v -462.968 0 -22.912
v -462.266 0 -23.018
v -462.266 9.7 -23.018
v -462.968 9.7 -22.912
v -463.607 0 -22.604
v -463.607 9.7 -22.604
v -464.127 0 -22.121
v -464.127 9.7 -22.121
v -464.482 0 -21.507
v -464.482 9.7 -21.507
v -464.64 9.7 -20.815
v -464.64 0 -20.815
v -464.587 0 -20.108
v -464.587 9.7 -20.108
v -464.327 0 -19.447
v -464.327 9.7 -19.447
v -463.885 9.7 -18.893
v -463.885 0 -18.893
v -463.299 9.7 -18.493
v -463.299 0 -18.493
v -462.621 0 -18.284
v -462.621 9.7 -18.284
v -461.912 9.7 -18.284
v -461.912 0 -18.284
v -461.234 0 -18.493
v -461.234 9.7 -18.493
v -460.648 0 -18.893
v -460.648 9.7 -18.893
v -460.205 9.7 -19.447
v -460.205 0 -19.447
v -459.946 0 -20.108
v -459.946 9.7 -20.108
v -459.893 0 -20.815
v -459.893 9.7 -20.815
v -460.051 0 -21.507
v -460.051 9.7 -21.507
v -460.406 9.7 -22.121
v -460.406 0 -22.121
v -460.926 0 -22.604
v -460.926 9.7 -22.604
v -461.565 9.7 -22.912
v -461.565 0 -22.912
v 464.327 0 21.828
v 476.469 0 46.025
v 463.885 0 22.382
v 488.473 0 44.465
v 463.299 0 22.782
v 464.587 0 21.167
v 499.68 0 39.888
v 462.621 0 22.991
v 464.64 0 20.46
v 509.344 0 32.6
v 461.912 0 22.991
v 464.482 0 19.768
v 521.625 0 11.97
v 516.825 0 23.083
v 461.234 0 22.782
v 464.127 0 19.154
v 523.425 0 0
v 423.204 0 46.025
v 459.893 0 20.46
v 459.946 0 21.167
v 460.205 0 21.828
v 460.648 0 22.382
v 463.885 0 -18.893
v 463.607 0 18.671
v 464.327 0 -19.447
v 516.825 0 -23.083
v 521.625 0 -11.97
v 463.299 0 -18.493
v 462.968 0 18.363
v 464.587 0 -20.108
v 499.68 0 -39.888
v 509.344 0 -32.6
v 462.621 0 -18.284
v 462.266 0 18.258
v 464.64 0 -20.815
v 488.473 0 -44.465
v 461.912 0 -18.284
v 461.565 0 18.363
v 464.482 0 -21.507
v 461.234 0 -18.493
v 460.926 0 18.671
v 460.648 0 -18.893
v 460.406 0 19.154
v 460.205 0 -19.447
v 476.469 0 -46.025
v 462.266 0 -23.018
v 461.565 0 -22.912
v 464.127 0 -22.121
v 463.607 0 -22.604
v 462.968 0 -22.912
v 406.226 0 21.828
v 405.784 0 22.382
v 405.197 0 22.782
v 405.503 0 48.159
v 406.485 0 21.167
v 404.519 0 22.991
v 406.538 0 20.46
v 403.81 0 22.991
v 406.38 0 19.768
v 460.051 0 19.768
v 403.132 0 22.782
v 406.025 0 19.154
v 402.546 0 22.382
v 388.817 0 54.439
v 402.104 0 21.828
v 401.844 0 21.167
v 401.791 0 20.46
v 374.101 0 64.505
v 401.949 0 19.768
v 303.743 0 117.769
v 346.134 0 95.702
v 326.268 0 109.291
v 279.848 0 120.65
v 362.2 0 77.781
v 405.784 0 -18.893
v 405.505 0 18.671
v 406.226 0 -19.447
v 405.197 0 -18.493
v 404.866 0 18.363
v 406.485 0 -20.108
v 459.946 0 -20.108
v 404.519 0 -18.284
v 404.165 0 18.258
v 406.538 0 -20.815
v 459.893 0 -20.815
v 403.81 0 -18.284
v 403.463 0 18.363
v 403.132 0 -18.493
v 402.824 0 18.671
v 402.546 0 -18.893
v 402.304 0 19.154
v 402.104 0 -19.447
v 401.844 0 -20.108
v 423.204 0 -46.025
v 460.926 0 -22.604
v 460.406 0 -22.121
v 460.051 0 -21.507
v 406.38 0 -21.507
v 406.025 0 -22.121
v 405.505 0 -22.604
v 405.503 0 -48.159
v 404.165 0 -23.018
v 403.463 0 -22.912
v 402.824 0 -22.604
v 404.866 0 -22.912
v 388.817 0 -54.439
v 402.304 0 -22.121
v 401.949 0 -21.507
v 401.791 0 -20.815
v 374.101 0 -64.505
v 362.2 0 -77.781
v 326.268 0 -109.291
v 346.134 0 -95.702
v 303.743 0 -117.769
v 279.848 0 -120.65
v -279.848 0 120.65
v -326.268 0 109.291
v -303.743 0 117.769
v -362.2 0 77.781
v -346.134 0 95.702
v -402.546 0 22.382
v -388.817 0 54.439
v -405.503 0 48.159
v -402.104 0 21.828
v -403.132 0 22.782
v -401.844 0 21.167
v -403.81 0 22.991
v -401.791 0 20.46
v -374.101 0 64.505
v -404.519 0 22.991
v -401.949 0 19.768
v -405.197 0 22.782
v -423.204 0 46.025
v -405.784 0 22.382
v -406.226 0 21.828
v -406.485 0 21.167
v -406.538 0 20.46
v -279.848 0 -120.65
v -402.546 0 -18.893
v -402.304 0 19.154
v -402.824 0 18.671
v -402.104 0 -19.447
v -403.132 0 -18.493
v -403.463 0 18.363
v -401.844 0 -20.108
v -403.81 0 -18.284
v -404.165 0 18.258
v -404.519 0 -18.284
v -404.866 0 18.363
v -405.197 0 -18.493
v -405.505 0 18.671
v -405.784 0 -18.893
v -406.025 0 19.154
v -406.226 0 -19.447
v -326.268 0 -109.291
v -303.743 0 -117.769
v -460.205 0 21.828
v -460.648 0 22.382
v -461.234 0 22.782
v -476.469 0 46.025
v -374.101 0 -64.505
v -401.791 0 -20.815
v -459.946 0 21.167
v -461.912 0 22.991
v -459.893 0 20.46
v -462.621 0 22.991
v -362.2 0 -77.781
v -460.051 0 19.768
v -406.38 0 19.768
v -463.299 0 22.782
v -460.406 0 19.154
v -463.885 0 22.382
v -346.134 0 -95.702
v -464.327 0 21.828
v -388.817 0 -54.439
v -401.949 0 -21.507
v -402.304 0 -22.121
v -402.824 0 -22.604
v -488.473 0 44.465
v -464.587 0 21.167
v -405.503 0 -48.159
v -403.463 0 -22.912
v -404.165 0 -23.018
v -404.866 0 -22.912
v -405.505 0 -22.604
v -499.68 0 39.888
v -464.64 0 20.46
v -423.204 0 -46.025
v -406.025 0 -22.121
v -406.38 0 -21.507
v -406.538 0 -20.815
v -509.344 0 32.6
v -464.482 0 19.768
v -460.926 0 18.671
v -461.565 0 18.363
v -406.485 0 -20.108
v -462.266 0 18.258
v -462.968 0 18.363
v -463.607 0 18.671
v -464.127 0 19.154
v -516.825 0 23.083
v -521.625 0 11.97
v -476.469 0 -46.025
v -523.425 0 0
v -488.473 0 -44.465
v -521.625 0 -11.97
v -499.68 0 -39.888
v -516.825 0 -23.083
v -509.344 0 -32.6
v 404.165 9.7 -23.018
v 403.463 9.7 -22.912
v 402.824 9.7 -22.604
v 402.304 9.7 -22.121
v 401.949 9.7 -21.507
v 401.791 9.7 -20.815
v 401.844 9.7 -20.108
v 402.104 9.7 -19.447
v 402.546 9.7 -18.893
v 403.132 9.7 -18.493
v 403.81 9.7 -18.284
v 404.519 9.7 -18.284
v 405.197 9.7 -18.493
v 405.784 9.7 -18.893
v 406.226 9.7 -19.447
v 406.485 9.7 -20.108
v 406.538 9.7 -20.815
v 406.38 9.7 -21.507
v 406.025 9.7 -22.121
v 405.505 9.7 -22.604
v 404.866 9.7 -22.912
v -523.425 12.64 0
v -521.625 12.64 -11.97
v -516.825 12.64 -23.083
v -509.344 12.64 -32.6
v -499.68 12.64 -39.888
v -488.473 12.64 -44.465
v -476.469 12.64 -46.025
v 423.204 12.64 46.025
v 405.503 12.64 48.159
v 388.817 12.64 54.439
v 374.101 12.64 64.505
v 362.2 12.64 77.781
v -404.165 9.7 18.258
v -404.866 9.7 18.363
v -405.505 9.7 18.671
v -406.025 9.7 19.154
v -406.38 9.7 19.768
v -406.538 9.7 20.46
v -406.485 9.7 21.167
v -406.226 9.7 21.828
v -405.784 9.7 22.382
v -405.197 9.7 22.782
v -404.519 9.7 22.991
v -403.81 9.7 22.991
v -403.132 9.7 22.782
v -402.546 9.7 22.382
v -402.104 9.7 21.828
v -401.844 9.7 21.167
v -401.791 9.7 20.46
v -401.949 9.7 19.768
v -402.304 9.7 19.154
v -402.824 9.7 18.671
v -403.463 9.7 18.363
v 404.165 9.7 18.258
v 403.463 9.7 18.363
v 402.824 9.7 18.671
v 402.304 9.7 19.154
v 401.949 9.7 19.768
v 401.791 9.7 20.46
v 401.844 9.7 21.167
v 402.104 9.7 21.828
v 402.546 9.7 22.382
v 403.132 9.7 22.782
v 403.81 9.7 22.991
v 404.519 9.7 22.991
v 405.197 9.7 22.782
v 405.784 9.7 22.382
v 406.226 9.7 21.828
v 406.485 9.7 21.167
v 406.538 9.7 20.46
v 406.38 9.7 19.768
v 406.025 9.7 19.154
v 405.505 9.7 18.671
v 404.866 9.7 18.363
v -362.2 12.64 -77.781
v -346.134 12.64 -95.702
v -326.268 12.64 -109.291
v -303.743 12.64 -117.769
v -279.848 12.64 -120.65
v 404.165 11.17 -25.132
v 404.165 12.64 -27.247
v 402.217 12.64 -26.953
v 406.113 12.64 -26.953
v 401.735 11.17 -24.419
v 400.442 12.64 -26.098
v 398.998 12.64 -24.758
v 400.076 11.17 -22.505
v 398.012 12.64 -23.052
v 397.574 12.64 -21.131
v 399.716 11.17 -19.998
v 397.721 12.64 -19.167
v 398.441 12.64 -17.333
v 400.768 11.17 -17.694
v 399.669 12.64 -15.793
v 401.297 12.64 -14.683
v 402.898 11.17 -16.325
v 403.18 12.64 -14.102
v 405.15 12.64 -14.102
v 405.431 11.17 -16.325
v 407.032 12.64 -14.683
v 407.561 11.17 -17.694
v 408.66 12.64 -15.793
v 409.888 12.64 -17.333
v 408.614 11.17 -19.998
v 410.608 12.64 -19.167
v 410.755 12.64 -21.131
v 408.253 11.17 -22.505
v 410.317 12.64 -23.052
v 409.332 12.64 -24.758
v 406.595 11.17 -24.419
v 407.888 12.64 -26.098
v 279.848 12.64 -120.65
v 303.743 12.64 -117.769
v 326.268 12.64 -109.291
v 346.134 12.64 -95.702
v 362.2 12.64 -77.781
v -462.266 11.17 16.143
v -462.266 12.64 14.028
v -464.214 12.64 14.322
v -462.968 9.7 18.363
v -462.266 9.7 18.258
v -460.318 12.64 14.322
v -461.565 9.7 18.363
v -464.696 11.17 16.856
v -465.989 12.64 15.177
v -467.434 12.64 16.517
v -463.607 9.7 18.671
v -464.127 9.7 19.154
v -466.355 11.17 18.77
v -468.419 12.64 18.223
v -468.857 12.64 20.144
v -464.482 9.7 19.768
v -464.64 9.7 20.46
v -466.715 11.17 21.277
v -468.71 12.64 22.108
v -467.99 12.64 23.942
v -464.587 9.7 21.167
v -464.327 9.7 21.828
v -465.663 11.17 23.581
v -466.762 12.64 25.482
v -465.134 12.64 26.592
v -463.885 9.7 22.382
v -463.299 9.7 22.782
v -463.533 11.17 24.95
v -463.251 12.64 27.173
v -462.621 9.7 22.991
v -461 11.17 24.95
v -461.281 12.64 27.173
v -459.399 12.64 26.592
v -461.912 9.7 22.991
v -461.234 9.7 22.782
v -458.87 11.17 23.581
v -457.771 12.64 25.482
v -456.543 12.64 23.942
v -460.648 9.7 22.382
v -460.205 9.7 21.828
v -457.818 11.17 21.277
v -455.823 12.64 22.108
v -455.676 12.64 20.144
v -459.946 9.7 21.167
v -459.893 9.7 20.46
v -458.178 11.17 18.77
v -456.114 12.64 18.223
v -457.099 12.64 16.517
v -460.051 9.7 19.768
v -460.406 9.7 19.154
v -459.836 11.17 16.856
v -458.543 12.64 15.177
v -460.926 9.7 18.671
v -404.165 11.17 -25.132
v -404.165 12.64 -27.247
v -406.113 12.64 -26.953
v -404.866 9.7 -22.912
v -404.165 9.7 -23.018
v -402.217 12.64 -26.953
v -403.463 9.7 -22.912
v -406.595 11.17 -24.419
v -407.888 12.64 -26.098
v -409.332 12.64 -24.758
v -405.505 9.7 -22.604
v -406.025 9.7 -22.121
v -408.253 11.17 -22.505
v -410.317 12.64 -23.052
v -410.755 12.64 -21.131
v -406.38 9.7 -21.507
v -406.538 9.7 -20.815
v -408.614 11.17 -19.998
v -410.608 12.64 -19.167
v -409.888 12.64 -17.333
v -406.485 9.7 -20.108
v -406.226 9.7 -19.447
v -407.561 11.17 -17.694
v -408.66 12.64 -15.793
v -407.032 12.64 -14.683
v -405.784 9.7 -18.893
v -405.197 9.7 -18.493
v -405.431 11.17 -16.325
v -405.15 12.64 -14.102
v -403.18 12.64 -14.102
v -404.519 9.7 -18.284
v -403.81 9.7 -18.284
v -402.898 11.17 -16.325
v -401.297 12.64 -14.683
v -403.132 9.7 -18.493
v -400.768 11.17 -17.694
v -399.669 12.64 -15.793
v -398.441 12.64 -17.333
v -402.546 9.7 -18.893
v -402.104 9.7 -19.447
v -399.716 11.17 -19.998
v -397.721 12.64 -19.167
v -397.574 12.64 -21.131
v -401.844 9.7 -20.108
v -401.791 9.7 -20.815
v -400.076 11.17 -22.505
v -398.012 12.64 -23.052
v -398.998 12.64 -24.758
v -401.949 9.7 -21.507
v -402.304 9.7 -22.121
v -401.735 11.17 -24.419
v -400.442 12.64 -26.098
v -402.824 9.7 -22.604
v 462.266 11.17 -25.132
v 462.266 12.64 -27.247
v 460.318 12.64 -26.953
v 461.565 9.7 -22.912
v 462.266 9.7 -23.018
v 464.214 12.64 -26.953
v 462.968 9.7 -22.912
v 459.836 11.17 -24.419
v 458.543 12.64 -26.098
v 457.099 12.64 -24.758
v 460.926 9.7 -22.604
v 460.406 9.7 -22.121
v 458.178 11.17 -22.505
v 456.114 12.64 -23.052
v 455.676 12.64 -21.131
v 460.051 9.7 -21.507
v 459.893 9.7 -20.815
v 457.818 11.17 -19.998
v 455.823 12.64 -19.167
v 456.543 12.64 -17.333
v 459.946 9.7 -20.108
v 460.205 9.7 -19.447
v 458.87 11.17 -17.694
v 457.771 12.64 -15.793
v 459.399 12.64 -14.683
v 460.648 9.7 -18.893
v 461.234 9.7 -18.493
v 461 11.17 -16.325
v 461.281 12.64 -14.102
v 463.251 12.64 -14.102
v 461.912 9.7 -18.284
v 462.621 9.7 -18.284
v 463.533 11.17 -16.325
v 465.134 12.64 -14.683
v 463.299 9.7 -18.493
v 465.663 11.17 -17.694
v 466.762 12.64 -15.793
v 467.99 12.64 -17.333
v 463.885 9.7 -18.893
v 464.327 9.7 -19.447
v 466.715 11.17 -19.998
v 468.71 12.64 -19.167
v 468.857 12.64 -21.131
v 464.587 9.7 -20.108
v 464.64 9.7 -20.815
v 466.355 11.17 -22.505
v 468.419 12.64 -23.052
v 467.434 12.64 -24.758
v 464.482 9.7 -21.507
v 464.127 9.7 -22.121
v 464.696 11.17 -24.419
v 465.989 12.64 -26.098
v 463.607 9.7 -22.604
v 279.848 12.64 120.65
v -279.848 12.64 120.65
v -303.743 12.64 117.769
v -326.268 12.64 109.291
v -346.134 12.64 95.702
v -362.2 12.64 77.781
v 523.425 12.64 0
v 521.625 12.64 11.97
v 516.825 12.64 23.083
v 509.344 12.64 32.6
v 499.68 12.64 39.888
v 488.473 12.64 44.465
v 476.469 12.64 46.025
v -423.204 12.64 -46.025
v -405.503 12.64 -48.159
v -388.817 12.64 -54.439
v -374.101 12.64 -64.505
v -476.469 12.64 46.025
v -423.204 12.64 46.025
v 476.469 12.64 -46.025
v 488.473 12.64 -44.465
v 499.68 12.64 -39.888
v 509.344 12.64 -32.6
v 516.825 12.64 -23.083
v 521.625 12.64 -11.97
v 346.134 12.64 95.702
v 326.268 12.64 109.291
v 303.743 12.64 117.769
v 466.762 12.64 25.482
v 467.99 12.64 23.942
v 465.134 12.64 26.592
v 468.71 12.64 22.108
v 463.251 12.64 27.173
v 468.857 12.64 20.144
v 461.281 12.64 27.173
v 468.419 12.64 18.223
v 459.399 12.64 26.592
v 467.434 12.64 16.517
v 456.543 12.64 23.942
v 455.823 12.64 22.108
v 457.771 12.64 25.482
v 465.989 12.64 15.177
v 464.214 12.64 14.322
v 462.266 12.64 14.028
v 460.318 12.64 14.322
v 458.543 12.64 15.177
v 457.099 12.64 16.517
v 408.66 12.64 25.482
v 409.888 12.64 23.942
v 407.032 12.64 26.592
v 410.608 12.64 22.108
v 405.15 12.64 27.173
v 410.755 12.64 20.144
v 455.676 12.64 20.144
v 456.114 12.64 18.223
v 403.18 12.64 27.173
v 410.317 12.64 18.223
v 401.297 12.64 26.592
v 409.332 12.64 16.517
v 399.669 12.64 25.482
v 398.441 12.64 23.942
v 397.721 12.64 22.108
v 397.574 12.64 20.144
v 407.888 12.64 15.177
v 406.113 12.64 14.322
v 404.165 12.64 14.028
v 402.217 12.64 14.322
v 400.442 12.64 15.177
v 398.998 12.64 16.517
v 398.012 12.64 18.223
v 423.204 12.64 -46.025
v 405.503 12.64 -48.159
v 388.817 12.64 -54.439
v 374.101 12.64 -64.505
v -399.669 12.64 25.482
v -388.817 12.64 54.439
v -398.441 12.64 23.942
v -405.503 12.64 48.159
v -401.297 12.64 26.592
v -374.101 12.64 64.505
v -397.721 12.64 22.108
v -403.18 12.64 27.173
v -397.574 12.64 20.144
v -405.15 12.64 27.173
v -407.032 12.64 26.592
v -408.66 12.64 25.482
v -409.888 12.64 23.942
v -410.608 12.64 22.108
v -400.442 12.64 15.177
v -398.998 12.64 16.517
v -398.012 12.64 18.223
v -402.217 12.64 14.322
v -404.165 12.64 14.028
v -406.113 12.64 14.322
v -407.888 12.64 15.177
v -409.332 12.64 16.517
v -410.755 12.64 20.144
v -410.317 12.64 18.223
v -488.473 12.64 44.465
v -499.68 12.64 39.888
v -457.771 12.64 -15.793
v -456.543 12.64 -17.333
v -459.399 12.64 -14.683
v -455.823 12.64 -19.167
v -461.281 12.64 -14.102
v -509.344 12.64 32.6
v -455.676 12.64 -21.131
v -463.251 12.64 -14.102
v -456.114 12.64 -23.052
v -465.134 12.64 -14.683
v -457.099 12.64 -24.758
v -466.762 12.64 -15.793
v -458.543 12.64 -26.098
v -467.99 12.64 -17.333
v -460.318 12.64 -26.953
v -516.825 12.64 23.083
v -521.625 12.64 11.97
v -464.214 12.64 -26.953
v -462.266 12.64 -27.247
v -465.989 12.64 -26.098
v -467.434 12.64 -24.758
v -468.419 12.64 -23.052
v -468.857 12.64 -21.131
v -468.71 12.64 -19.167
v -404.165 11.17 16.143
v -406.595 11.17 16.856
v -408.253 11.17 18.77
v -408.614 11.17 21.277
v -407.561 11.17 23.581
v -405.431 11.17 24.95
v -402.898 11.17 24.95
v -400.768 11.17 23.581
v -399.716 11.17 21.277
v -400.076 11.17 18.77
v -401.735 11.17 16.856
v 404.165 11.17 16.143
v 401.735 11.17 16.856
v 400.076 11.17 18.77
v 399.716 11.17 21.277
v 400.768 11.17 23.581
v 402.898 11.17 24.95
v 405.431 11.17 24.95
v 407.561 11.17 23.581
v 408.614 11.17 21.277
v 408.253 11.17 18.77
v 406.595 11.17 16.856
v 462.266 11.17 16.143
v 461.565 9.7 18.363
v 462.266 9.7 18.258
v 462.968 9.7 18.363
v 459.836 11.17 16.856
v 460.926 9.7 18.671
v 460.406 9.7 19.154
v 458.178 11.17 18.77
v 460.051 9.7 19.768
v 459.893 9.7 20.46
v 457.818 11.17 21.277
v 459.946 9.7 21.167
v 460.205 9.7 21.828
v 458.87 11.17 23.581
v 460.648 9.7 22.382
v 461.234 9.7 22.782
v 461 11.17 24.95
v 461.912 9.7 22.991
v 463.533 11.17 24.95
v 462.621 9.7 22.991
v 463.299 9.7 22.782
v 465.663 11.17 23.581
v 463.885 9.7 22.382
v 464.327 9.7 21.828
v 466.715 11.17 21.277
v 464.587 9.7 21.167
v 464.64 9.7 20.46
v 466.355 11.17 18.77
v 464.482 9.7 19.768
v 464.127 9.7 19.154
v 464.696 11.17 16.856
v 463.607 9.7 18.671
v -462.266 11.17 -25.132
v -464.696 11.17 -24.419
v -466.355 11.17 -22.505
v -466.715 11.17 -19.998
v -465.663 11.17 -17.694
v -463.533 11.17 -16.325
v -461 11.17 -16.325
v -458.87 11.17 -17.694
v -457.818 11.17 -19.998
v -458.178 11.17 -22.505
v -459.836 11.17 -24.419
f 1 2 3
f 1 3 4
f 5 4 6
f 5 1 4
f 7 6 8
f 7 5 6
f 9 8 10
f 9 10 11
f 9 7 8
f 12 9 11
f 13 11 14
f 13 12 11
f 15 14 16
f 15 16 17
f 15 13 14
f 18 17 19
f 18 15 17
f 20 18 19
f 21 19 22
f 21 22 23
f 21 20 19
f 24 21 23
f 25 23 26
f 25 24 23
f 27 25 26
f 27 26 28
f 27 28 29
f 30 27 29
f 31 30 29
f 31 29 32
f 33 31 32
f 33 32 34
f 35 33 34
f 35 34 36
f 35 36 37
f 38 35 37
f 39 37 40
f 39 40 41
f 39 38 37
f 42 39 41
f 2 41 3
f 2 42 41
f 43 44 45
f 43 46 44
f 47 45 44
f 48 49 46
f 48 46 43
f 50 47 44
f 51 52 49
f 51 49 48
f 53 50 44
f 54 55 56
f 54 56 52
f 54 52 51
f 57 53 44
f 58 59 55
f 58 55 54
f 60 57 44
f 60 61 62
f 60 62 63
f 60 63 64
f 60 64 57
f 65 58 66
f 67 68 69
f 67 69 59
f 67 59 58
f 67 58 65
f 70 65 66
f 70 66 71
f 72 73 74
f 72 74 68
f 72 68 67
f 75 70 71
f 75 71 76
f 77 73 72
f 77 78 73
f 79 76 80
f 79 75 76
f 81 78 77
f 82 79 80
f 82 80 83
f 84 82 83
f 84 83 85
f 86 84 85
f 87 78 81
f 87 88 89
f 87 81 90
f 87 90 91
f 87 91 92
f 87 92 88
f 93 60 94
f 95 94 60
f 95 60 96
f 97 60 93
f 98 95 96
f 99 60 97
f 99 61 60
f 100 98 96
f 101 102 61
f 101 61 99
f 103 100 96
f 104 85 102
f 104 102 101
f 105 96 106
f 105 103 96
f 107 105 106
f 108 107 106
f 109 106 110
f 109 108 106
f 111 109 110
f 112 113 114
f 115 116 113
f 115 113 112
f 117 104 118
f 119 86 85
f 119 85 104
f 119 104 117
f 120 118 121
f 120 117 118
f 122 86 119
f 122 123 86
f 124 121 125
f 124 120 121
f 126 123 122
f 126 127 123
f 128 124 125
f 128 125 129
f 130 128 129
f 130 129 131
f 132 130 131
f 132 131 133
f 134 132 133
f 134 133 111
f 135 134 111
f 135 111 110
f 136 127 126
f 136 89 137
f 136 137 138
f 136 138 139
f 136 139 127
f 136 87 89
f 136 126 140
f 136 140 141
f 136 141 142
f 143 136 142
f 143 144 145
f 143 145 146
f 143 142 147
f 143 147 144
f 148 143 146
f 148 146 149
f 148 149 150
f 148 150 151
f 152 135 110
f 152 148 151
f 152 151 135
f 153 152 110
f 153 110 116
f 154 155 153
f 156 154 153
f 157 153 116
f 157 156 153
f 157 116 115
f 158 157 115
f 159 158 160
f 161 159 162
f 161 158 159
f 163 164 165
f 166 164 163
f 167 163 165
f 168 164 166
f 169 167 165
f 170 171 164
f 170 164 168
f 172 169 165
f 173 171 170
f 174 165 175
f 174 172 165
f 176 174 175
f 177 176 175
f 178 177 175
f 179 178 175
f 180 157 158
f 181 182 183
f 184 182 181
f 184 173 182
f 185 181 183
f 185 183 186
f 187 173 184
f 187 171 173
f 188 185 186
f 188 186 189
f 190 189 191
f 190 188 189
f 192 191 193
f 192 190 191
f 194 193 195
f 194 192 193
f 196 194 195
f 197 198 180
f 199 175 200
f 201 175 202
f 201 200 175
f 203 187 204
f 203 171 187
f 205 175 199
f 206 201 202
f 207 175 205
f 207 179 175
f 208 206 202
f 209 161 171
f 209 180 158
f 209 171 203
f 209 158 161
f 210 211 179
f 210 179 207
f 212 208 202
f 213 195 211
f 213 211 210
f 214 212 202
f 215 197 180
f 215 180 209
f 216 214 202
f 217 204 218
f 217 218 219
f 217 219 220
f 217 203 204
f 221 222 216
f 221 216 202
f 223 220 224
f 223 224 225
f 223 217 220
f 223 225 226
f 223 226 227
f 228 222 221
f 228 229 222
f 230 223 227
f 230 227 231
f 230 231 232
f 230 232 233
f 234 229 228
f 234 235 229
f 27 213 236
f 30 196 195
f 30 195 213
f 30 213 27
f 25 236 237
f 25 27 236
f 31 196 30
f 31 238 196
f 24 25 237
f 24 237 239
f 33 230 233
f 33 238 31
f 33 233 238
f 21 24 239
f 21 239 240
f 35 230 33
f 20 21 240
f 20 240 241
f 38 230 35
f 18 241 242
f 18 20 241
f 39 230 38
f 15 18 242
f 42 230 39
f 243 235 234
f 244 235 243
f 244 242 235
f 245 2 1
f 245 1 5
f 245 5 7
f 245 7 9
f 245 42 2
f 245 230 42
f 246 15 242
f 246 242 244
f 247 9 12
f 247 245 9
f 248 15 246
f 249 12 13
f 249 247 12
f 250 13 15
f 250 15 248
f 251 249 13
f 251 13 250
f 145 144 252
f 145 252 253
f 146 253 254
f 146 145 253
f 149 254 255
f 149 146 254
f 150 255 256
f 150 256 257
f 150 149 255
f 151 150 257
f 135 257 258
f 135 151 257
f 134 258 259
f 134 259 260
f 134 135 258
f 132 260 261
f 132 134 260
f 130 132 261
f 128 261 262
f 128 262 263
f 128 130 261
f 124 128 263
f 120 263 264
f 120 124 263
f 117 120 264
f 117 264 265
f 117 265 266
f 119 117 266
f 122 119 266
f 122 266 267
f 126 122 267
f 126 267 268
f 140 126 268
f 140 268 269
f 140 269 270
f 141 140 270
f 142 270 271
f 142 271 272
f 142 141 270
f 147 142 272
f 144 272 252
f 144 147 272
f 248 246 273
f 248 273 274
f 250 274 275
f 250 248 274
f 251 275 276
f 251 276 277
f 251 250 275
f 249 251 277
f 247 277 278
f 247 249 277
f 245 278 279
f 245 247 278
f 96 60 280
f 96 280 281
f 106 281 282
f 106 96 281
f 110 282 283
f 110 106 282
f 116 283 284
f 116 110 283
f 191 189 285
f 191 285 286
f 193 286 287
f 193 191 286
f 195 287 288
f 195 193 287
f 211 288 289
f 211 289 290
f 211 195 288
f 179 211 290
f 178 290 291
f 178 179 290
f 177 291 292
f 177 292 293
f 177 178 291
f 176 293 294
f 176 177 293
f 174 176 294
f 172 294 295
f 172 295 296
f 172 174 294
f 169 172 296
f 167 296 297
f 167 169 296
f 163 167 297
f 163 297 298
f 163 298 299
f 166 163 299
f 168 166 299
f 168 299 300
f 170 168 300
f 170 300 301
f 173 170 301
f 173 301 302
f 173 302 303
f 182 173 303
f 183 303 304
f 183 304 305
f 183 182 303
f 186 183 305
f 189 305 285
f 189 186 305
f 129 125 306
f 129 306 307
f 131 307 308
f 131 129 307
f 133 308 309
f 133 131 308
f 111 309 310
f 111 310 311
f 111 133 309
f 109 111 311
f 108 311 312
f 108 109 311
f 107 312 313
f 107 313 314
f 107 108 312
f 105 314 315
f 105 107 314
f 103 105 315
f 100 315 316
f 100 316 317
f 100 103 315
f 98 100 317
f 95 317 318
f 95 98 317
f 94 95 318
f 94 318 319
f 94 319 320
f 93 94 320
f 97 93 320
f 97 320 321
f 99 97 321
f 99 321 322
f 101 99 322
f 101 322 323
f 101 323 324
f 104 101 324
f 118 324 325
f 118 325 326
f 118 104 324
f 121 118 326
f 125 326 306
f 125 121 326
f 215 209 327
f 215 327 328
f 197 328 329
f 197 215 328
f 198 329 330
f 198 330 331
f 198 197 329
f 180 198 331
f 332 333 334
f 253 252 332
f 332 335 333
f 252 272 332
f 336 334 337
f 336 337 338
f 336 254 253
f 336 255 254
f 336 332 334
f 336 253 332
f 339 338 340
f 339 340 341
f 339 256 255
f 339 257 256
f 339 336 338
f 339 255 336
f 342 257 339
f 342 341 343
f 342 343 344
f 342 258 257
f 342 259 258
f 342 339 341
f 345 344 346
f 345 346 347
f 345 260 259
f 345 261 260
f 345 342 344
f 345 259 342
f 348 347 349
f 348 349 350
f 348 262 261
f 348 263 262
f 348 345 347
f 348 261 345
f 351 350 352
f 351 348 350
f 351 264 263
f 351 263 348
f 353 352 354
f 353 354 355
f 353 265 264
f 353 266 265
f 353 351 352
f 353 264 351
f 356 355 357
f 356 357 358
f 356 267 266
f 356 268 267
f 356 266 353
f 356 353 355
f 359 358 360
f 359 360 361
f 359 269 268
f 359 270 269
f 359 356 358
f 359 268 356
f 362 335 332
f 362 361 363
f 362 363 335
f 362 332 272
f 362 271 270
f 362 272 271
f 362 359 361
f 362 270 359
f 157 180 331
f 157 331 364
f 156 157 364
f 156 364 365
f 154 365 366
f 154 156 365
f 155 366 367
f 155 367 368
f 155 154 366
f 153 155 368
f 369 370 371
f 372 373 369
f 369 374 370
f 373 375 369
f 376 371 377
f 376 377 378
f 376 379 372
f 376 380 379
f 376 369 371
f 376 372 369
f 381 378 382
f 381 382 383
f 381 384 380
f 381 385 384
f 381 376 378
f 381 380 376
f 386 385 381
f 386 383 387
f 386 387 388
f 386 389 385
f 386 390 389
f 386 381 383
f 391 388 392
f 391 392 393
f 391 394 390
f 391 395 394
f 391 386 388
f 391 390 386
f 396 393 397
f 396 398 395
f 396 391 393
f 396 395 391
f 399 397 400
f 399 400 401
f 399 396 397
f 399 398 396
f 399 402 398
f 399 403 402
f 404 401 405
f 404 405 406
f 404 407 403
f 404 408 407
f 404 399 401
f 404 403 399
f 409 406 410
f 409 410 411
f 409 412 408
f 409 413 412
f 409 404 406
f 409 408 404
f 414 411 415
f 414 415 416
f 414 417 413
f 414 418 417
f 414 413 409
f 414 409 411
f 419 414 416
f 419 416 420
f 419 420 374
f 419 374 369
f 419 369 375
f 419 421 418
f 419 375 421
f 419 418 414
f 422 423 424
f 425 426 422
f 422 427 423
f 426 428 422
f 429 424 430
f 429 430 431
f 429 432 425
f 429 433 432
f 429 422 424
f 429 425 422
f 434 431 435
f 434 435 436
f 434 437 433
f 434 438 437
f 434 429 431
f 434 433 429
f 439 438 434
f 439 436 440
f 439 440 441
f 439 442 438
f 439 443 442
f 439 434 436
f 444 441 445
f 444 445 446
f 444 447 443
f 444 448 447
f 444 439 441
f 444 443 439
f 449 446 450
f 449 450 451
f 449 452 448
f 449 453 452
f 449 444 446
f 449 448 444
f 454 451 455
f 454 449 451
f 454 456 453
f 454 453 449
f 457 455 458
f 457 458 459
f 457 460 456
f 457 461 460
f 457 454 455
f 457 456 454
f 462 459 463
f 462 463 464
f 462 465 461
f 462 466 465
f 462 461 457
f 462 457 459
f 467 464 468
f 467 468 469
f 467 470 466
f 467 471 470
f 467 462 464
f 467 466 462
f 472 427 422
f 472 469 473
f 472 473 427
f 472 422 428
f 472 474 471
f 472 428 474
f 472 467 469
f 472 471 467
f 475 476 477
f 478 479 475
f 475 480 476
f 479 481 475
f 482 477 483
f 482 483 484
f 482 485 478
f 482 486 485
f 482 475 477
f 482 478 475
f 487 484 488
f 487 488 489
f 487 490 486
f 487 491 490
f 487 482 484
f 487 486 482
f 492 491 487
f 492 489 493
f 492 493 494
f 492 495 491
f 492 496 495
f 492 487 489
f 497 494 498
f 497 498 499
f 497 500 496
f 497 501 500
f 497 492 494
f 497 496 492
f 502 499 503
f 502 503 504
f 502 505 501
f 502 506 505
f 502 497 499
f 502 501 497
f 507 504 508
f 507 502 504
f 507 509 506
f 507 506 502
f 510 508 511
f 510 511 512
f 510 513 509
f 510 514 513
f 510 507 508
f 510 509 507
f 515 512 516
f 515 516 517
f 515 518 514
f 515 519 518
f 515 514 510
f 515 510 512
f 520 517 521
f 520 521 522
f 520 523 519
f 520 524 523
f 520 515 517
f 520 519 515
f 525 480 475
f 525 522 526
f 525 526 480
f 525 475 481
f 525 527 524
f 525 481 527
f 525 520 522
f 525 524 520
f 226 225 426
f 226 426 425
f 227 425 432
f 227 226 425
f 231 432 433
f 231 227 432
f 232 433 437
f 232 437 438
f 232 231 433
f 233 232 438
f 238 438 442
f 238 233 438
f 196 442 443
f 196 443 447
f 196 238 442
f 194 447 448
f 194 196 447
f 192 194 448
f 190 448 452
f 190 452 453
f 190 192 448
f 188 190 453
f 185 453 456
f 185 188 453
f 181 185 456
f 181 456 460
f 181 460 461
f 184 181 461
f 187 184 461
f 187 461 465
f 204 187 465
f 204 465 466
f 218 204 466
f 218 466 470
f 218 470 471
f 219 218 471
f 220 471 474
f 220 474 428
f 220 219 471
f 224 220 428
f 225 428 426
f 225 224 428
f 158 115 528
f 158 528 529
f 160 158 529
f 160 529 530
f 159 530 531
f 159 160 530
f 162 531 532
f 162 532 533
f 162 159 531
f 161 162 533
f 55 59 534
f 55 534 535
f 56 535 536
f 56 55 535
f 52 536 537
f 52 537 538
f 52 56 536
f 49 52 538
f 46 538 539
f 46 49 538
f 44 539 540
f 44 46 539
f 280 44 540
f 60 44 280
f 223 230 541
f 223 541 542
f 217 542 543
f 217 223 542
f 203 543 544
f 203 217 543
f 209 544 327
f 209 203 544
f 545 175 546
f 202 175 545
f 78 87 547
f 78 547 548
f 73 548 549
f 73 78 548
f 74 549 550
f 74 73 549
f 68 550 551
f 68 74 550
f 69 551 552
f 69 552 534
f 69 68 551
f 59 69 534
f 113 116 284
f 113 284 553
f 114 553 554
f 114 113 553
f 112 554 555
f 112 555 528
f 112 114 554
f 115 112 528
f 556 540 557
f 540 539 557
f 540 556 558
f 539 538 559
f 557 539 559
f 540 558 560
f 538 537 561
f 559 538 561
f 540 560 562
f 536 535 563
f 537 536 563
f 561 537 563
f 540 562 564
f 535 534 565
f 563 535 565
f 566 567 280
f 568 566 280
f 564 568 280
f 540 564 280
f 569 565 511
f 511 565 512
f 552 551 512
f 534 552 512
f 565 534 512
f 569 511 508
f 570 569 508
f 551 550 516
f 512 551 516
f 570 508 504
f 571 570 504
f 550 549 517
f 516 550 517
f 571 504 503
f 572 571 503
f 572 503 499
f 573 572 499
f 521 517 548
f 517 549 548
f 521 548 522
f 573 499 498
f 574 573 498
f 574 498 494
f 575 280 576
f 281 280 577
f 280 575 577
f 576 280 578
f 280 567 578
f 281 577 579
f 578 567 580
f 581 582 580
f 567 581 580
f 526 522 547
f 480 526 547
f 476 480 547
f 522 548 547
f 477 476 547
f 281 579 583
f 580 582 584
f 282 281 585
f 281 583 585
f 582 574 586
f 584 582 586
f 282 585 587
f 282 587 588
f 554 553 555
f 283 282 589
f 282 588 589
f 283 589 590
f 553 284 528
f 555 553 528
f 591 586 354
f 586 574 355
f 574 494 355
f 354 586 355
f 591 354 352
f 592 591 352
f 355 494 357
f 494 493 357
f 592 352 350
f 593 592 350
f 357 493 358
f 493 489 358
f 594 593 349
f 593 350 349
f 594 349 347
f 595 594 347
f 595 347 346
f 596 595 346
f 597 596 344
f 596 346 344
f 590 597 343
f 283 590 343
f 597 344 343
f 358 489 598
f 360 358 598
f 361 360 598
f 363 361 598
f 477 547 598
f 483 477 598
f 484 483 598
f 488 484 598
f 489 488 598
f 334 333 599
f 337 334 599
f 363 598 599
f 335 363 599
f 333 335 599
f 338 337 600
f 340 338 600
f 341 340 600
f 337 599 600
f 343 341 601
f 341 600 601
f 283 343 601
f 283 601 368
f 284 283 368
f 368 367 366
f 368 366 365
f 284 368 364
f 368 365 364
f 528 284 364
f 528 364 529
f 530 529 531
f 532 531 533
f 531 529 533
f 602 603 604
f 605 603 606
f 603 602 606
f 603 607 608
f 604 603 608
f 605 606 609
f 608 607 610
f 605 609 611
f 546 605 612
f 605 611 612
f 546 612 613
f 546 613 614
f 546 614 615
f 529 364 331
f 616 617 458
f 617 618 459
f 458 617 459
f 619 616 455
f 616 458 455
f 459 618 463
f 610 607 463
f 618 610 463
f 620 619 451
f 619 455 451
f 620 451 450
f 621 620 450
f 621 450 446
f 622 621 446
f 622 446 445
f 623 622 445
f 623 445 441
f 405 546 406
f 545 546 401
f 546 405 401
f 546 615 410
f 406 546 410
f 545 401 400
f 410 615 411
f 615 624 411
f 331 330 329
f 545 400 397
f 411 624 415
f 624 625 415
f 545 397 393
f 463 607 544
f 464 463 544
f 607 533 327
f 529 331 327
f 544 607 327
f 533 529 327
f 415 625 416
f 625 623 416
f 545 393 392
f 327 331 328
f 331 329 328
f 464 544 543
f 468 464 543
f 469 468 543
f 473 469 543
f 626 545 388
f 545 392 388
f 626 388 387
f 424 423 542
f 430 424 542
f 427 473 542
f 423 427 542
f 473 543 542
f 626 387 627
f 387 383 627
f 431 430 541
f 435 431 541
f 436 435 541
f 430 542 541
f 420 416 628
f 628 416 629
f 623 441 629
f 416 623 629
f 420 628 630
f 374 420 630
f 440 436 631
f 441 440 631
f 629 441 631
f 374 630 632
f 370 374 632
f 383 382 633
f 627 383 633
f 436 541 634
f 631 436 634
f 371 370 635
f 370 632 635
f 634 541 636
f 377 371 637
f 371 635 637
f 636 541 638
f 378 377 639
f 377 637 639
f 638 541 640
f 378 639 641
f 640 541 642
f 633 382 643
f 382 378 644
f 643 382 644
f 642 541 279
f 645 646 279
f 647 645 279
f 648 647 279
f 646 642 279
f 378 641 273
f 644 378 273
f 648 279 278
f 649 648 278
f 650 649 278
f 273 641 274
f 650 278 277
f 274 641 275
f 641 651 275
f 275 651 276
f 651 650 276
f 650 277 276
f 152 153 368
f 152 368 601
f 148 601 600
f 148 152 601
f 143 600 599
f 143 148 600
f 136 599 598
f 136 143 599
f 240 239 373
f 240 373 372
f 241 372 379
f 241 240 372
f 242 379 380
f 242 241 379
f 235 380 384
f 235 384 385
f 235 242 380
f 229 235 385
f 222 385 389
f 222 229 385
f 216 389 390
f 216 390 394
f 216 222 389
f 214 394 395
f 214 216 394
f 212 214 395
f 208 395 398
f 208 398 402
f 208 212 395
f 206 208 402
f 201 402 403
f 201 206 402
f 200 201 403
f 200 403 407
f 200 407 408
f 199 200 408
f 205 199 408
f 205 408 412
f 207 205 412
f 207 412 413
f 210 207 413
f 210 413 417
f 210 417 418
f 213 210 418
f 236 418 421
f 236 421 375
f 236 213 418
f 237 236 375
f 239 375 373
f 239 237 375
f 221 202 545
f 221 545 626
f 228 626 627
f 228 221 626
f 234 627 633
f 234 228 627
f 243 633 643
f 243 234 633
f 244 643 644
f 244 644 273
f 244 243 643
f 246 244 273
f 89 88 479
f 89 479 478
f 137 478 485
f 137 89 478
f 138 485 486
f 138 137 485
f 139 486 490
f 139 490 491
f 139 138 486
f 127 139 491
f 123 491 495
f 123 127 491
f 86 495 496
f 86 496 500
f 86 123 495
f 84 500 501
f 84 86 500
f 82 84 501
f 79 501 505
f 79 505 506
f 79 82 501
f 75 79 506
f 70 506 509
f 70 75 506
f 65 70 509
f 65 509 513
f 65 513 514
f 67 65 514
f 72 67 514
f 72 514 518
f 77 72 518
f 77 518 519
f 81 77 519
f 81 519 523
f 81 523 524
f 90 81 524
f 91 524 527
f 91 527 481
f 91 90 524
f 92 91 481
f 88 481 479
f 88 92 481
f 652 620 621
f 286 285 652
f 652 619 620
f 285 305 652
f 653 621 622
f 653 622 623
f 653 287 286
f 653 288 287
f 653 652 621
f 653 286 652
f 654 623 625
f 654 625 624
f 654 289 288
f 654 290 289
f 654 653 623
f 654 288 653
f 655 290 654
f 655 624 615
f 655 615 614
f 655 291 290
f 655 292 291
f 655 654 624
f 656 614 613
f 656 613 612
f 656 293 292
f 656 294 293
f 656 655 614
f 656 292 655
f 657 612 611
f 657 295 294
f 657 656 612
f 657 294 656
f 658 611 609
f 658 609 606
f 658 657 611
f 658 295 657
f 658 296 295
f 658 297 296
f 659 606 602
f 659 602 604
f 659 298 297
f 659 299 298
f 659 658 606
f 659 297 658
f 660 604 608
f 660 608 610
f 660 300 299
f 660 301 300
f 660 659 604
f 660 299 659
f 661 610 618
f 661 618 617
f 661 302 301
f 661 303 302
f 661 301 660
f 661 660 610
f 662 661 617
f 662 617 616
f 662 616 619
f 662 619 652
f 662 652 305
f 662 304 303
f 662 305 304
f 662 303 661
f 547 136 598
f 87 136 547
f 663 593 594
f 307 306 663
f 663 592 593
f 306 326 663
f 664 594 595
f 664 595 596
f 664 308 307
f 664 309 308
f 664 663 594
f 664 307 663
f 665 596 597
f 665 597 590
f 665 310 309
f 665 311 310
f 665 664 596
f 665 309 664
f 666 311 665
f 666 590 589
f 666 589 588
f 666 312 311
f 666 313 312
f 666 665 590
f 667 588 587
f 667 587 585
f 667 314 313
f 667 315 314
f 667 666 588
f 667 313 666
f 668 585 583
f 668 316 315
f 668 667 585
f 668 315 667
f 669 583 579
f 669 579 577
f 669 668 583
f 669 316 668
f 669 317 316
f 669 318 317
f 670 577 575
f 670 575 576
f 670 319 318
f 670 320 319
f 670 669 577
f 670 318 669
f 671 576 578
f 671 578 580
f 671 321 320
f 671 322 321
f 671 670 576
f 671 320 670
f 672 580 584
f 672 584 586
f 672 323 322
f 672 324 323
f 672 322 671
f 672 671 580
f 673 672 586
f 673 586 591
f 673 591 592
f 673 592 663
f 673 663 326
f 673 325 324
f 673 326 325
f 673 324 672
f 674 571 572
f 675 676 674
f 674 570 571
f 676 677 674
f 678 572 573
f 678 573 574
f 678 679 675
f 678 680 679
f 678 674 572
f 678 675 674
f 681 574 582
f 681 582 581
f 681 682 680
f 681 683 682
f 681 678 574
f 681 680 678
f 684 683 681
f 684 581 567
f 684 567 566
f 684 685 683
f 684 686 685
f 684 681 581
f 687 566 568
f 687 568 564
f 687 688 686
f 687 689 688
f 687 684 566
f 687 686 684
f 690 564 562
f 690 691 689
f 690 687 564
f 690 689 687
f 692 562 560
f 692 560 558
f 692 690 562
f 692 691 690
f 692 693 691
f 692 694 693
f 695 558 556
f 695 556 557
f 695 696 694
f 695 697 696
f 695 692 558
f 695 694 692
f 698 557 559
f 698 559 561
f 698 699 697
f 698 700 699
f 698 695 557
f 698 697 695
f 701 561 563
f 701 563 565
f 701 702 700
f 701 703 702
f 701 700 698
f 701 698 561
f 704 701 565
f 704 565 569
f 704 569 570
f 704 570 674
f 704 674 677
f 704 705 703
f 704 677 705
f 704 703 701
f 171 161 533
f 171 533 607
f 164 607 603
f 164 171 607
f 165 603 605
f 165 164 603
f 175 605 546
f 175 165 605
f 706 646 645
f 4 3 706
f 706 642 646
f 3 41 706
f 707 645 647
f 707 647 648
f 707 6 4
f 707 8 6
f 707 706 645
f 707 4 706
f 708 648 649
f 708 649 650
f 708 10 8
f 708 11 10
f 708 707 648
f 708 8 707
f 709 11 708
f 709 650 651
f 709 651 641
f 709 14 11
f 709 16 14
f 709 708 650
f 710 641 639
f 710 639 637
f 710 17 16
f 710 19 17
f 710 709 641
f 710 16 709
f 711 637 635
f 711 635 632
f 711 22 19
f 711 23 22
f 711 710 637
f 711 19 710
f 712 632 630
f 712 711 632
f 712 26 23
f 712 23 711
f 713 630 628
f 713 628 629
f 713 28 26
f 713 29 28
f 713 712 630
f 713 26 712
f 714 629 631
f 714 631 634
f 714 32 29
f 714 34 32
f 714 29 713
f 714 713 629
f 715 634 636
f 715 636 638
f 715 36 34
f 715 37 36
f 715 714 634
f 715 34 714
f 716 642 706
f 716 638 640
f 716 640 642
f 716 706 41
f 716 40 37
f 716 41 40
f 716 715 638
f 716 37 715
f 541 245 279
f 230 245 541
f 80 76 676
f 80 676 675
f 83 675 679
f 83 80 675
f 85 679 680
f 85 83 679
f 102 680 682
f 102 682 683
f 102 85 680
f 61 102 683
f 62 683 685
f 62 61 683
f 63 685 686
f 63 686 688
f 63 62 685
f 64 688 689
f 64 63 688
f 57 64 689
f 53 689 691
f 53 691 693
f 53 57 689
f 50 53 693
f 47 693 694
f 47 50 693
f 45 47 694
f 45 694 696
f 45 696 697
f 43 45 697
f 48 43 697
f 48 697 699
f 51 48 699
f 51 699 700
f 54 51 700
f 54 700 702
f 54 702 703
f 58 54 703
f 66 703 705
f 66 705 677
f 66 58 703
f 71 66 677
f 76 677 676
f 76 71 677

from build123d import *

# Parameters (mm, degrees)
SKETCH1_R           = 2.38
BOSS_EXTRUDE1_DEPTH = 12.64
CHAMFER1_SIZE       = 4.2291
CHAMFER1_SIZE2      = 2.94


with BuildPart() as part:
    # Sketch1 → Boss-Extrude1 (new body)
    with BuildSketch(Plane(origin=(0, 0, 0), x_dir=(1, 0, 0), z_dir=(0, 1, 0))):
        with BuildLine():
            Line((279.847634913, -120.65), (-279.847634913, -120.65))
            ThreePointArc((-279.847634913, -120.65), (-326.268482654, -109.291064504), (-362.199527238, -77.781057273))
            ThreePointArc((-362.199527238, -77.781057273), (-388.816521313, -54.439078616), (-423.204150273, -46.024608002))
            Line((-423.204150273, -46.024608002), (-476.469252285, -46.024608002))
            ThreePointArc((-476.469252285, -46.024608002), (-509.344325494, -32.599702877), (-523.424733457, 0))
            ThreePointArc((-523.424733457, 0), (-509.344325494, 32.599702877), (-476.469252285, 46.024608002))
            Line((-476.469252285, 46.024608002), (-423.204150273, 46.024608002))
            ThreePointArc((-423.204150273, 46.024608002), (-388.816521313, 54.439078616), (-362.199527238, 77.781057273))
            ThreePointArc((-362.199527238, 77.781057273), (-326.268482654, 109.291064504), (-279.847634913, 120.65))
            Line((-279.847634913, 120.65), (279.847634913, 120.65))
            ThreePointArc((279.847634913, 120.65), (326.268482654, 109.291064504), (362.199527238, 77.781057273))
            ThreePointArc((362.199527238, 77.781057273), (388.816521313, 54.439078616), (423.204150273, 46.024608002))
            Line((423.204150273, 46.024608002), (476.469252285, 46.024608002))
            ThreePointArc((476.469252285, 46.024608002), (509.344325494, 32.599702877), (523.424733457, 0))
            ThreePointArc((523.424733457, 0), (509.344325494, -32.599702877), (476.469252285, -46.024608002))
            Line((476.469252285, -46.024608002), (423.204150273, -46.024608002))
            ThreePointArc((423.204150273, -46.024608002), (388.816521313, -54.439078616), (362.199527238, -77.781057273))
            ThreePointArc((362.199527238, -77.781057273), (326.268482654, -109.291064504), (279.847634913, -120.65))
        make_face()
        with Locations(Location((-404.164718127, 20.6375, 0), (0, 0, 90))):
            Circle(SKETCH1_R, mode=Mode.SUBTRACT)
        with Locations(Location((-462.266329753, 20.6375, 0), (0, 0, 90))):
            Circle(SKETCH1_R, mode=Mode.SUBTRACT)
        with Locations(Location((-404.164718127, -20.6375, 0), (0, 0, 90))):
            Circle(SKETCH1_R, mode=Mode.SUBTRACT)
        with Locations(Location((-462.266329753, -20.6375, 0), (0, 0, 90))):
            Circle(SKETCH1_R, mode=Mode.SUBTRACT)
        with Locations(Location((462.266329753, -20.6375, 0), (0, 0, 90))):
            Circle(SKETCH1_R, mode=Mode.SUBTRACT)
        with Locations(Location((404.164718127, -20.6375, 0), (0, 0, 90))):
            Circle(SKETCH1_R, mode=Mode.SUBTRACT)
        with Locations(Location((462.266329753, 20.6375, 0), (0, 0, 90))):
            Circle(SKETCH1_R, mode=Mode.SUBTRACT)
        with Locations(Location((404.164718127, 20.6375, 0), (0, 0, 90))):
            Circle(SKETCH1_R, mode=Mode.SUBTRACT)
    extrude(amount=BOSS_EXTRUDE1_DEPTH)

    # Chamfer1
    chamfer1_edges = [part.edges().sort_by_distance(p)[0] for p in [
        (-462.266329753, 12.64, -18.2575),
        (-404.164718127, 12.64, 23.0175),
        (-462.266329753, 12.64, 23.0175),
        (-404.164718127, 12.64, -18.2575),
        (462.266329753, 12.64, 23.0175),
        (404.164718127, 12.64, 23.0175),
        (462.266329753, 12.64, -18.2575),
        (404.164718127, 12.64, -18.2575),
    ]]
    chamfer1_side = [part.faces().sort_by_distance(p)[0] for p in [
        (0, 12.64, 0),
    ]]
    chamfer(chamfer1_edges, length=CHAMFER1_SIZE, length2=CHAMFER1_SIZE2, reference=chamfer1_side[0])


solid = part.part
